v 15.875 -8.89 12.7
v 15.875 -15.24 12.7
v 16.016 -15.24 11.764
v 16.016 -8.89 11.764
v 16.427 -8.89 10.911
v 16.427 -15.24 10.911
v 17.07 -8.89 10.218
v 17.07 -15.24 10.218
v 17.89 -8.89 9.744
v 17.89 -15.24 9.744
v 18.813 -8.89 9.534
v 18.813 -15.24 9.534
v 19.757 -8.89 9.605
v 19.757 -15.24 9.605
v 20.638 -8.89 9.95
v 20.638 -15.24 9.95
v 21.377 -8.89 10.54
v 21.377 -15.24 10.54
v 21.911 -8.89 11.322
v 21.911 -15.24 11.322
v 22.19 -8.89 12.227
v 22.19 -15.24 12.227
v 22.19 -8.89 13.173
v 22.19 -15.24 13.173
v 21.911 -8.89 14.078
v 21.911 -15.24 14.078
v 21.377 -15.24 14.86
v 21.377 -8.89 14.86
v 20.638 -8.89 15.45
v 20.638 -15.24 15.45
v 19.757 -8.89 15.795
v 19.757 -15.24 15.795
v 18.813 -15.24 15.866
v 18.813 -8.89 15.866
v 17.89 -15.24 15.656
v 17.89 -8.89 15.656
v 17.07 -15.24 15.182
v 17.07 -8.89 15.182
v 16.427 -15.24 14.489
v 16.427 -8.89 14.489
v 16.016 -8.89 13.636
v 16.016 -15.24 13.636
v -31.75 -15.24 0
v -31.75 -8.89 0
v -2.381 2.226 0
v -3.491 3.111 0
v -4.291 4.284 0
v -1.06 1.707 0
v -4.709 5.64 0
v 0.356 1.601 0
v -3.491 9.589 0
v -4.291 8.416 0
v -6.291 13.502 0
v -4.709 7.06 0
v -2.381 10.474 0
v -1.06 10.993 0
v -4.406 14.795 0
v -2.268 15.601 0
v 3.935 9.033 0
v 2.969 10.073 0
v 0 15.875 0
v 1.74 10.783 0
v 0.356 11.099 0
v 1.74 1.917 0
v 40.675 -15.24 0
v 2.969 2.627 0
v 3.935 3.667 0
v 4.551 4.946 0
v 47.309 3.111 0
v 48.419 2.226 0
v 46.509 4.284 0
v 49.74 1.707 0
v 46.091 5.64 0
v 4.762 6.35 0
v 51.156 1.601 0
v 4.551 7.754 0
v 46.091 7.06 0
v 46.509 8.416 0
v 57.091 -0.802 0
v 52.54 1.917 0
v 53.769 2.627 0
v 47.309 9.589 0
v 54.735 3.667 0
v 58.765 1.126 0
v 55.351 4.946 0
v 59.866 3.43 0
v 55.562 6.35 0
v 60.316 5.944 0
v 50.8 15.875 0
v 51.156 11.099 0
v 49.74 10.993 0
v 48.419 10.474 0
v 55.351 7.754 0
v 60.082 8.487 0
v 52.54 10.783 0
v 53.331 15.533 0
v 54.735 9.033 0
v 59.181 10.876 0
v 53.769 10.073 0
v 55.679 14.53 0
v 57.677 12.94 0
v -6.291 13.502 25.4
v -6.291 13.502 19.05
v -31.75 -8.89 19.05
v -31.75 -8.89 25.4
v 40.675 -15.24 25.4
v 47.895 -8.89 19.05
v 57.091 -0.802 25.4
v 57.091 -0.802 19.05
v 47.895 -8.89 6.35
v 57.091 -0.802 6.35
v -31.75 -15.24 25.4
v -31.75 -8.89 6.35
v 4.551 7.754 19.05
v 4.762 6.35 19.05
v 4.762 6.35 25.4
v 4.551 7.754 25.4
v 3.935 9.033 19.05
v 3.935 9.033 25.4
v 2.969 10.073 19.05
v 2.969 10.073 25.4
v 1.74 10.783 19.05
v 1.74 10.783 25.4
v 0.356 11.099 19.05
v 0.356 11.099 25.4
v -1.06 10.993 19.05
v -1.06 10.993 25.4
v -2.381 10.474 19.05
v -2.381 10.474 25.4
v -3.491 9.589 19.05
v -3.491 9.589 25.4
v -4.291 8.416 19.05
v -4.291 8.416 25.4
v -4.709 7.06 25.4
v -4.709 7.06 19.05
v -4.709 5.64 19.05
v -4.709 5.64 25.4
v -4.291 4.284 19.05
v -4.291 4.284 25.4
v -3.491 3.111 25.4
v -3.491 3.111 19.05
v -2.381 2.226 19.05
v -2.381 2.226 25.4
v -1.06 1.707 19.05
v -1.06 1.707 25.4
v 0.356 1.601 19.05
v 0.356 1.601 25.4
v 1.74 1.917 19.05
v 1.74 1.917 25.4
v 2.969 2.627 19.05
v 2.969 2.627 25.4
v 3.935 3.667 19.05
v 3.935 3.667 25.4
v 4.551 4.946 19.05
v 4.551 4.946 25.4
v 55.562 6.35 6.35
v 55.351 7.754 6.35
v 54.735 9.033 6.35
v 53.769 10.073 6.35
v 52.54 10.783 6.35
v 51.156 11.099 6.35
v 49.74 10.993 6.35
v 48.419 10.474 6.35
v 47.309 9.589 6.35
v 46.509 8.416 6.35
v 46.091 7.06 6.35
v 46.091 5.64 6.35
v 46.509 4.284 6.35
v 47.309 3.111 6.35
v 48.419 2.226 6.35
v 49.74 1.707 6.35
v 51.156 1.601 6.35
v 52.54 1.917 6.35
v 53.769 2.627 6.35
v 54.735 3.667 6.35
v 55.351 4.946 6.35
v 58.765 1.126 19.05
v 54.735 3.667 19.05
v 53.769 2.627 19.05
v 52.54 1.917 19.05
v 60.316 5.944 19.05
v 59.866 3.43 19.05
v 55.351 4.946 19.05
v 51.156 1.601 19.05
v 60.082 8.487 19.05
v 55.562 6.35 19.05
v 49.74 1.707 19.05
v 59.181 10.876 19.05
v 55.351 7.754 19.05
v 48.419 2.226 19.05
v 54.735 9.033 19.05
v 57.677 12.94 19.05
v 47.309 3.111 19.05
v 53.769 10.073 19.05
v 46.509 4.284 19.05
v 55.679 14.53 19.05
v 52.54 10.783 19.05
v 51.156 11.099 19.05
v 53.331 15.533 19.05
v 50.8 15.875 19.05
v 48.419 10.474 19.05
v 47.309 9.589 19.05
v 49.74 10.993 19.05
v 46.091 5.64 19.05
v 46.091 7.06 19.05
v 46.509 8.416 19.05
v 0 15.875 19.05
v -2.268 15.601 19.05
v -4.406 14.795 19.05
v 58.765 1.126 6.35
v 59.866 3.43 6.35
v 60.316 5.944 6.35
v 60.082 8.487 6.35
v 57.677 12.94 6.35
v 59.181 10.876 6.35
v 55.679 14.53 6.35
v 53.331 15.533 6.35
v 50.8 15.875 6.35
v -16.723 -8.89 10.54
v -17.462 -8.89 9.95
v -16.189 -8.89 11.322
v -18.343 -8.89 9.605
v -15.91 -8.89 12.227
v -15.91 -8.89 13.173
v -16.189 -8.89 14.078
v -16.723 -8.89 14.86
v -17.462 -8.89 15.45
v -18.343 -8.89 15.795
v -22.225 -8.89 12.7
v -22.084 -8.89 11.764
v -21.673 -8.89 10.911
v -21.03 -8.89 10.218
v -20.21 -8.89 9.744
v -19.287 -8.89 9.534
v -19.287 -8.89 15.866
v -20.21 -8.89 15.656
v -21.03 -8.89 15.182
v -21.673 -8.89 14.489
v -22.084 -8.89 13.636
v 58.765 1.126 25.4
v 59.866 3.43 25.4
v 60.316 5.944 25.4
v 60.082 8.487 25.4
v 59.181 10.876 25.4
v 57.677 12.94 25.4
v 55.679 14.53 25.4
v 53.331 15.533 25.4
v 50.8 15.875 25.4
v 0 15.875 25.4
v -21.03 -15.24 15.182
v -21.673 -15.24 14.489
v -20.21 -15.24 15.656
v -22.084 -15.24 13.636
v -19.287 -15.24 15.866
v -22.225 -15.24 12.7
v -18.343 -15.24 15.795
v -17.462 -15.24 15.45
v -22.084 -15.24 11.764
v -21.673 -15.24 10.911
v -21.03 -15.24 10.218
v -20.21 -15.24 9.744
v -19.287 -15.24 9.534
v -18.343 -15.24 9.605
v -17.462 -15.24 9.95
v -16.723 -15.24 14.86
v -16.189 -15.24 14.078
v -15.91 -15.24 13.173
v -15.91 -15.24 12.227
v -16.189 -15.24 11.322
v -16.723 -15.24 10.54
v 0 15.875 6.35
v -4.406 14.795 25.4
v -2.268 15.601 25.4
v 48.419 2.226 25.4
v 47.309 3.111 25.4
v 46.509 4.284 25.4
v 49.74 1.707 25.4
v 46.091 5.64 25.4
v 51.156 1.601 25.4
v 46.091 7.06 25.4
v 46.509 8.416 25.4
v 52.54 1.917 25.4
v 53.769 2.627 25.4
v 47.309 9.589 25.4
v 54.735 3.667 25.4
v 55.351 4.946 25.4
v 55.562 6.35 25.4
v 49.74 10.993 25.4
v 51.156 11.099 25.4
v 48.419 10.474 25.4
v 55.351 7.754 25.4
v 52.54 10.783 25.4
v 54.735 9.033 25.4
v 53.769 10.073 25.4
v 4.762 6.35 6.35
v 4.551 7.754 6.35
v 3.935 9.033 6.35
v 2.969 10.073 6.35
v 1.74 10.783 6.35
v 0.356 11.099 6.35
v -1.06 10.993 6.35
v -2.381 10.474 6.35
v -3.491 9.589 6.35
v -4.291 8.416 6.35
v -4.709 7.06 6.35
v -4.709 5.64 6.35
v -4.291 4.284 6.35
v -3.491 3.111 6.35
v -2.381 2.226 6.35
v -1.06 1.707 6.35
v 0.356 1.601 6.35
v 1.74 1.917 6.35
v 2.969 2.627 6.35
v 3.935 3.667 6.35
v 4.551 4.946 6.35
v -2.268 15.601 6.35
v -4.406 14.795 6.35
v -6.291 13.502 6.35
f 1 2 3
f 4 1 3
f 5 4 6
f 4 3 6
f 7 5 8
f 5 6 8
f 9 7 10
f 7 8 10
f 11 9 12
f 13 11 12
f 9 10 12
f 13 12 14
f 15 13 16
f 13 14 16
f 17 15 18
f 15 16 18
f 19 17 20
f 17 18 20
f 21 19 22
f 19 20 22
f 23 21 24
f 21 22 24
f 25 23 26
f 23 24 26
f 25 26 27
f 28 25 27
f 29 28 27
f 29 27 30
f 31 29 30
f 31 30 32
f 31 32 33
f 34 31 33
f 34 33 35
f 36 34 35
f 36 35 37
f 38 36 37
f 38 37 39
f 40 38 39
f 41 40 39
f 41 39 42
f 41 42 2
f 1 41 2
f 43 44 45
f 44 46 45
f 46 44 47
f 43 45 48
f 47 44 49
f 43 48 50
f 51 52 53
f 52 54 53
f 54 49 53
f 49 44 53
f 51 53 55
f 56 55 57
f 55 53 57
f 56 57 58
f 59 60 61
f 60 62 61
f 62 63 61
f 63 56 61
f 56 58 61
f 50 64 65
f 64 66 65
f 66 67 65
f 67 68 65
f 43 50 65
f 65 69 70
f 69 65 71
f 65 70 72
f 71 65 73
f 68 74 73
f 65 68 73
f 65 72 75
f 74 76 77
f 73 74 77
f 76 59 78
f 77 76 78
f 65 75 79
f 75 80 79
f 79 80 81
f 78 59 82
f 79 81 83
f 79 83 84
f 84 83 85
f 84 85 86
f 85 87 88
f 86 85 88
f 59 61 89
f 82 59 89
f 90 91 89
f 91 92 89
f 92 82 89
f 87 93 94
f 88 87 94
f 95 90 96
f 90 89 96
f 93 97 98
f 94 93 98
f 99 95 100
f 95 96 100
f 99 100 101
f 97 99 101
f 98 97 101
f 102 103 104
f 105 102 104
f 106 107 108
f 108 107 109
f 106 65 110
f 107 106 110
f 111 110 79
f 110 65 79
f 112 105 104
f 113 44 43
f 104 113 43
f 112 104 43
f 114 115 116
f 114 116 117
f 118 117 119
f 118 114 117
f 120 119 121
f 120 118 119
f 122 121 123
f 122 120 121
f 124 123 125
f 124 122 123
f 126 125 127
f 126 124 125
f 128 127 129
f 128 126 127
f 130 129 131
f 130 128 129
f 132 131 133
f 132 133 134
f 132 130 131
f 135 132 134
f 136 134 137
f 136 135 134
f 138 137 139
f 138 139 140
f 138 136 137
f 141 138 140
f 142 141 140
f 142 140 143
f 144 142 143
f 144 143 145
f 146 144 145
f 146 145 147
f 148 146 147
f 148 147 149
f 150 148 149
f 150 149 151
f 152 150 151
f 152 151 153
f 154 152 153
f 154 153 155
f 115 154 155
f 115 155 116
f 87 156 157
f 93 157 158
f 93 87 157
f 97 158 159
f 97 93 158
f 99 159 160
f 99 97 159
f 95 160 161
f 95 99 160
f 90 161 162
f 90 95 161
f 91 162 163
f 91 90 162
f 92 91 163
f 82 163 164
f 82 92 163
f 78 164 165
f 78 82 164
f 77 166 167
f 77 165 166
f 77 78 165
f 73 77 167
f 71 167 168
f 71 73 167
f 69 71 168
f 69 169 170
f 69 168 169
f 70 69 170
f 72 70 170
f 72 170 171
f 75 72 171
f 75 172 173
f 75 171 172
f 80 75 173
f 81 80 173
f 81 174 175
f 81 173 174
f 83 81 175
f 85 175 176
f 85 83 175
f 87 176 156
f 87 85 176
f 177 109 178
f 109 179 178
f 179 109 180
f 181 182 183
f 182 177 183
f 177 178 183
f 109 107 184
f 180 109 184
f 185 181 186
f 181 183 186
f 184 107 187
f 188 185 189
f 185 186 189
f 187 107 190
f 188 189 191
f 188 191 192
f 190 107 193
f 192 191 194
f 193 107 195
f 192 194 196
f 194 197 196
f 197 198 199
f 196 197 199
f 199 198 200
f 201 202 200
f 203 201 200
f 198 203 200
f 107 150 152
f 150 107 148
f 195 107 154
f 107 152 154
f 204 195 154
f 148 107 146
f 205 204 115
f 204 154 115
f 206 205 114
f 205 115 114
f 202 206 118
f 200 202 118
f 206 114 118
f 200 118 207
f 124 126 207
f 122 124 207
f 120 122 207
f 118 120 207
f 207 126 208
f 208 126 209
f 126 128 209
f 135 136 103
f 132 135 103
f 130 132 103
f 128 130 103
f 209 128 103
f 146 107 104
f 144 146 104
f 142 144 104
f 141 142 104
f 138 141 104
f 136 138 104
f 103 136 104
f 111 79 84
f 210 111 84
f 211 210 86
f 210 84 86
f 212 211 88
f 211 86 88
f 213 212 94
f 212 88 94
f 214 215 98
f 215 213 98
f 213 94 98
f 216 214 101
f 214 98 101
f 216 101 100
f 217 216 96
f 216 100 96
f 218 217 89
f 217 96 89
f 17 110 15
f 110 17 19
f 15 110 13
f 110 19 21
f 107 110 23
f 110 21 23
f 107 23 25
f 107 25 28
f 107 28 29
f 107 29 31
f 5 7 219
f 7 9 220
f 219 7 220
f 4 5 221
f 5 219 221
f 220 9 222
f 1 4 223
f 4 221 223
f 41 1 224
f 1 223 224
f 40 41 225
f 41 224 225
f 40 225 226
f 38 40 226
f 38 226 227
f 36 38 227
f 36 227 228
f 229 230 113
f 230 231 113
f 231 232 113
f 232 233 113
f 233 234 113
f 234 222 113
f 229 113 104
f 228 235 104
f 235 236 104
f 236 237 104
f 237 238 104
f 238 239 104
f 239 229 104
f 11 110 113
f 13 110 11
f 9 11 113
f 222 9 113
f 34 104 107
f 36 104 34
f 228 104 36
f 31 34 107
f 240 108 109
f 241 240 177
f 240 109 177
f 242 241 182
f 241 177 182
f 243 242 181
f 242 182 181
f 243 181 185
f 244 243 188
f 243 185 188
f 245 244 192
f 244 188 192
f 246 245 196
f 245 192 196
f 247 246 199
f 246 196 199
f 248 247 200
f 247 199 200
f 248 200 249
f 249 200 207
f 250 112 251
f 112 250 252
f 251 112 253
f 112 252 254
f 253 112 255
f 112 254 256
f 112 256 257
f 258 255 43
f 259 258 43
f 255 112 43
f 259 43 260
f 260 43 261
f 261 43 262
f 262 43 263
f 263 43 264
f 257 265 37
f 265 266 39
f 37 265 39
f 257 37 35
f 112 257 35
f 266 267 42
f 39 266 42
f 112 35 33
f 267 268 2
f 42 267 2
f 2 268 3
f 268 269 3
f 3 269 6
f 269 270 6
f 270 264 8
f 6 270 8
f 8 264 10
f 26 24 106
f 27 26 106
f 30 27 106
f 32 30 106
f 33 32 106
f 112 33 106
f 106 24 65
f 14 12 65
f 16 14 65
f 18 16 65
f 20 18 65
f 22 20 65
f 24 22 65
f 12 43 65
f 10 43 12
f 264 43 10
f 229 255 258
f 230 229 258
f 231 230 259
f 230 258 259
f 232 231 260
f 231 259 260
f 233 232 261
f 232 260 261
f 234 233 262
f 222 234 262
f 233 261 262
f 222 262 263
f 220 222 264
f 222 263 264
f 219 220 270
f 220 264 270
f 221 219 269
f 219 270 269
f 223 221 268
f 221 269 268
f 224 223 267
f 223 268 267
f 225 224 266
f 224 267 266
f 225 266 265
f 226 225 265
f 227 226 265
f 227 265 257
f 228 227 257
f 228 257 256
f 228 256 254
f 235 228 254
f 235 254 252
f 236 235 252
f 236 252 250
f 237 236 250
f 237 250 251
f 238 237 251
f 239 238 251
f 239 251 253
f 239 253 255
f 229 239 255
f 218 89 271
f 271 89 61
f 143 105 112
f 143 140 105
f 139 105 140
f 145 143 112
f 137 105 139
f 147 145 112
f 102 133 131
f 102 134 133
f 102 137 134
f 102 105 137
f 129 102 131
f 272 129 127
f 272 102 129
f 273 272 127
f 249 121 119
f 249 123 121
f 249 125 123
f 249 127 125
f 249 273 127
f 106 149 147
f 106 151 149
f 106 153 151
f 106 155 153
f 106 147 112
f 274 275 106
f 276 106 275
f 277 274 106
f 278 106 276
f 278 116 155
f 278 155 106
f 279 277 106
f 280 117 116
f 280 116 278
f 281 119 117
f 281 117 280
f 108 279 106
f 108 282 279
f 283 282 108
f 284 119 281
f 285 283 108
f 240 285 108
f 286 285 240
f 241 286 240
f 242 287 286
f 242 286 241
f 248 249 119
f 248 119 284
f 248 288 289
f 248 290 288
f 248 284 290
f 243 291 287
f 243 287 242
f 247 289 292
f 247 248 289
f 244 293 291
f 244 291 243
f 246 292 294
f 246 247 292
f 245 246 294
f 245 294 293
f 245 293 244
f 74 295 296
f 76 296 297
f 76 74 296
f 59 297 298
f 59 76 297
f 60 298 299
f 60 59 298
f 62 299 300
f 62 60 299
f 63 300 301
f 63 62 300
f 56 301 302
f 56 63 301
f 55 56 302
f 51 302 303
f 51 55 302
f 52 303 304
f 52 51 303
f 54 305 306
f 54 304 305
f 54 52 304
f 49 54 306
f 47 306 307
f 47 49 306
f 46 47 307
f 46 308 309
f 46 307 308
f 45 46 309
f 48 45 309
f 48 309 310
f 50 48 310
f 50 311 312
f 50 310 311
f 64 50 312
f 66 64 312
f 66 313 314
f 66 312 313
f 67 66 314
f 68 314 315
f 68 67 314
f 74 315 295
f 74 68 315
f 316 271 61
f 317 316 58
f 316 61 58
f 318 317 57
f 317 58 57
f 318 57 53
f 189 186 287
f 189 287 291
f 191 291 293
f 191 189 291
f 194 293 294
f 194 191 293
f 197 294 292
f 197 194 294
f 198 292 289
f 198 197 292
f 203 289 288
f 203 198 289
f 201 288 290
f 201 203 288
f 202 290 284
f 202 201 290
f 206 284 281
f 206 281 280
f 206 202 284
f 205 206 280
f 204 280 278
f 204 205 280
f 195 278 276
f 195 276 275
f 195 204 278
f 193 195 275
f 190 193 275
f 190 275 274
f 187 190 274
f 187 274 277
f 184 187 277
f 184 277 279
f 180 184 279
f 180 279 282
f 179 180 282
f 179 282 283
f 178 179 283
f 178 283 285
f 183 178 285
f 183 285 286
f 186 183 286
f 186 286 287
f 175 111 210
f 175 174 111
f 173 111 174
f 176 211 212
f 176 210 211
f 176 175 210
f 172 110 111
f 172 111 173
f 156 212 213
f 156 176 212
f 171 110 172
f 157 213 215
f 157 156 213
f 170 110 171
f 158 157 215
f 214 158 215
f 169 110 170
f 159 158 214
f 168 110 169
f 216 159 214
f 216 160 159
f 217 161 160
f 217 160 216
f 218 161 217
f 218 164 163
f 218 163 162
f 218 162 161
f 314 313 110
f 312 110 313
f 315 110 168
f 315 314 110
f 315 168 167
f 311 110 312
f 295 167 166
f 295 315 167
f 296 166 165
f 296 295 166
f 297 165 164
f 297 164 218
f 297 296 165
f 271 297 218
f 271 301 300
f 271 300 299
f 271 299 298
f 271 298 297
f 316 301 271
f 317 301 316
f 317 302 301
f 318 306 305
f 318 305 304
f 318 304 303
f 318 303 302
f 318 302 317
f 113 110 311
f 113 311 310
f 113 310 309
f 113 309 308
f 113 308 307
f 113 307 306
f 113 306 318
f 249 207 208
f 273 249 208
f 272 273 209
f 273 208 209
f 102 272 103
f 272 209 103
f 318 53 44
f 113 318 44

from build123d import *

# Parameters (mm, degrees)
SKETCH1_R           = 4.7625
BOSS_EXTRUDE1_DEPTH = 25.4
SKETCH2_R           = 3.175
CUT_EXTRUDE1_DEPTH  = 32.115
SKETCH3_W           = 12.7
SKETCH3_H           = 28.80549591
CUT_EXTRUDE2_DEPTH  = 93.075


with BuildPart() as part:
    # Sketch1 → Boss-Extrude1 (new body)
    with BuildSketch(Plane.XY):
        with BuildLine():
            Line((50.8, 15.875), (0, 15.875))
            ThreePointArc((0, 15.875), (-3.361595996, 15.262087149), (-6.29056934, 13.502227791))
            Line((-6.29056934, 13.502227791), (-31.75, -8.89))
            Line((-31.75, -8.89), (-31.75, -15.24))
            Line((-31.75, -15.24), (40.675165573, -15.24))
            Line((40.675165573, -15.24), (57.09056934, -0.802227791))
            ThreePointArc((57.09056934, -0.802227791), (59.712087149, 9.711595996), (50.8, 15.875))
        make_face()
        with Locations((0, 6.35)):
            Circle(SKETCH1_R, mode=Mode.SUBTRACT)
        with Locations((50.8, 6.35)):
            Circle(SKETCH1_R, mode=Mode.SUBTRACT)
    extrude(amount=BOSS_EXTRUDE1_DEPTH)

    # Sketch2 → Cut-Extrude1 (cut, through all)
    with BuildSketch(Plane(origin=(0, -15.24, 0), x_dir=(-1, 0, 0), z_dir=(0, -1, 0))):
        with Locations((-19.05, -12.7)):
            Circle(SKETCH2_R)
        with Locations((19.05, -12.7)):
            Circle(SKETCH2_R)
    extrude(amount=-CUT_EXTRUDE1_DEPTH, mode=Mode.SUBTRACT)

    # Sketch3 → Cut-Extrude2 (cut, through all)
    with BuildSketch(Plane.ZY.offset(31.75)):
        with Locations((12.7, 5.512747955)):
            Rectangle(SKETCH3_W, SKETCH3_H)
    extrude(amount=-CUT_EXTRUDE2_DEPTH, mode=Mode.SUBTRACT)


solid = part.part
